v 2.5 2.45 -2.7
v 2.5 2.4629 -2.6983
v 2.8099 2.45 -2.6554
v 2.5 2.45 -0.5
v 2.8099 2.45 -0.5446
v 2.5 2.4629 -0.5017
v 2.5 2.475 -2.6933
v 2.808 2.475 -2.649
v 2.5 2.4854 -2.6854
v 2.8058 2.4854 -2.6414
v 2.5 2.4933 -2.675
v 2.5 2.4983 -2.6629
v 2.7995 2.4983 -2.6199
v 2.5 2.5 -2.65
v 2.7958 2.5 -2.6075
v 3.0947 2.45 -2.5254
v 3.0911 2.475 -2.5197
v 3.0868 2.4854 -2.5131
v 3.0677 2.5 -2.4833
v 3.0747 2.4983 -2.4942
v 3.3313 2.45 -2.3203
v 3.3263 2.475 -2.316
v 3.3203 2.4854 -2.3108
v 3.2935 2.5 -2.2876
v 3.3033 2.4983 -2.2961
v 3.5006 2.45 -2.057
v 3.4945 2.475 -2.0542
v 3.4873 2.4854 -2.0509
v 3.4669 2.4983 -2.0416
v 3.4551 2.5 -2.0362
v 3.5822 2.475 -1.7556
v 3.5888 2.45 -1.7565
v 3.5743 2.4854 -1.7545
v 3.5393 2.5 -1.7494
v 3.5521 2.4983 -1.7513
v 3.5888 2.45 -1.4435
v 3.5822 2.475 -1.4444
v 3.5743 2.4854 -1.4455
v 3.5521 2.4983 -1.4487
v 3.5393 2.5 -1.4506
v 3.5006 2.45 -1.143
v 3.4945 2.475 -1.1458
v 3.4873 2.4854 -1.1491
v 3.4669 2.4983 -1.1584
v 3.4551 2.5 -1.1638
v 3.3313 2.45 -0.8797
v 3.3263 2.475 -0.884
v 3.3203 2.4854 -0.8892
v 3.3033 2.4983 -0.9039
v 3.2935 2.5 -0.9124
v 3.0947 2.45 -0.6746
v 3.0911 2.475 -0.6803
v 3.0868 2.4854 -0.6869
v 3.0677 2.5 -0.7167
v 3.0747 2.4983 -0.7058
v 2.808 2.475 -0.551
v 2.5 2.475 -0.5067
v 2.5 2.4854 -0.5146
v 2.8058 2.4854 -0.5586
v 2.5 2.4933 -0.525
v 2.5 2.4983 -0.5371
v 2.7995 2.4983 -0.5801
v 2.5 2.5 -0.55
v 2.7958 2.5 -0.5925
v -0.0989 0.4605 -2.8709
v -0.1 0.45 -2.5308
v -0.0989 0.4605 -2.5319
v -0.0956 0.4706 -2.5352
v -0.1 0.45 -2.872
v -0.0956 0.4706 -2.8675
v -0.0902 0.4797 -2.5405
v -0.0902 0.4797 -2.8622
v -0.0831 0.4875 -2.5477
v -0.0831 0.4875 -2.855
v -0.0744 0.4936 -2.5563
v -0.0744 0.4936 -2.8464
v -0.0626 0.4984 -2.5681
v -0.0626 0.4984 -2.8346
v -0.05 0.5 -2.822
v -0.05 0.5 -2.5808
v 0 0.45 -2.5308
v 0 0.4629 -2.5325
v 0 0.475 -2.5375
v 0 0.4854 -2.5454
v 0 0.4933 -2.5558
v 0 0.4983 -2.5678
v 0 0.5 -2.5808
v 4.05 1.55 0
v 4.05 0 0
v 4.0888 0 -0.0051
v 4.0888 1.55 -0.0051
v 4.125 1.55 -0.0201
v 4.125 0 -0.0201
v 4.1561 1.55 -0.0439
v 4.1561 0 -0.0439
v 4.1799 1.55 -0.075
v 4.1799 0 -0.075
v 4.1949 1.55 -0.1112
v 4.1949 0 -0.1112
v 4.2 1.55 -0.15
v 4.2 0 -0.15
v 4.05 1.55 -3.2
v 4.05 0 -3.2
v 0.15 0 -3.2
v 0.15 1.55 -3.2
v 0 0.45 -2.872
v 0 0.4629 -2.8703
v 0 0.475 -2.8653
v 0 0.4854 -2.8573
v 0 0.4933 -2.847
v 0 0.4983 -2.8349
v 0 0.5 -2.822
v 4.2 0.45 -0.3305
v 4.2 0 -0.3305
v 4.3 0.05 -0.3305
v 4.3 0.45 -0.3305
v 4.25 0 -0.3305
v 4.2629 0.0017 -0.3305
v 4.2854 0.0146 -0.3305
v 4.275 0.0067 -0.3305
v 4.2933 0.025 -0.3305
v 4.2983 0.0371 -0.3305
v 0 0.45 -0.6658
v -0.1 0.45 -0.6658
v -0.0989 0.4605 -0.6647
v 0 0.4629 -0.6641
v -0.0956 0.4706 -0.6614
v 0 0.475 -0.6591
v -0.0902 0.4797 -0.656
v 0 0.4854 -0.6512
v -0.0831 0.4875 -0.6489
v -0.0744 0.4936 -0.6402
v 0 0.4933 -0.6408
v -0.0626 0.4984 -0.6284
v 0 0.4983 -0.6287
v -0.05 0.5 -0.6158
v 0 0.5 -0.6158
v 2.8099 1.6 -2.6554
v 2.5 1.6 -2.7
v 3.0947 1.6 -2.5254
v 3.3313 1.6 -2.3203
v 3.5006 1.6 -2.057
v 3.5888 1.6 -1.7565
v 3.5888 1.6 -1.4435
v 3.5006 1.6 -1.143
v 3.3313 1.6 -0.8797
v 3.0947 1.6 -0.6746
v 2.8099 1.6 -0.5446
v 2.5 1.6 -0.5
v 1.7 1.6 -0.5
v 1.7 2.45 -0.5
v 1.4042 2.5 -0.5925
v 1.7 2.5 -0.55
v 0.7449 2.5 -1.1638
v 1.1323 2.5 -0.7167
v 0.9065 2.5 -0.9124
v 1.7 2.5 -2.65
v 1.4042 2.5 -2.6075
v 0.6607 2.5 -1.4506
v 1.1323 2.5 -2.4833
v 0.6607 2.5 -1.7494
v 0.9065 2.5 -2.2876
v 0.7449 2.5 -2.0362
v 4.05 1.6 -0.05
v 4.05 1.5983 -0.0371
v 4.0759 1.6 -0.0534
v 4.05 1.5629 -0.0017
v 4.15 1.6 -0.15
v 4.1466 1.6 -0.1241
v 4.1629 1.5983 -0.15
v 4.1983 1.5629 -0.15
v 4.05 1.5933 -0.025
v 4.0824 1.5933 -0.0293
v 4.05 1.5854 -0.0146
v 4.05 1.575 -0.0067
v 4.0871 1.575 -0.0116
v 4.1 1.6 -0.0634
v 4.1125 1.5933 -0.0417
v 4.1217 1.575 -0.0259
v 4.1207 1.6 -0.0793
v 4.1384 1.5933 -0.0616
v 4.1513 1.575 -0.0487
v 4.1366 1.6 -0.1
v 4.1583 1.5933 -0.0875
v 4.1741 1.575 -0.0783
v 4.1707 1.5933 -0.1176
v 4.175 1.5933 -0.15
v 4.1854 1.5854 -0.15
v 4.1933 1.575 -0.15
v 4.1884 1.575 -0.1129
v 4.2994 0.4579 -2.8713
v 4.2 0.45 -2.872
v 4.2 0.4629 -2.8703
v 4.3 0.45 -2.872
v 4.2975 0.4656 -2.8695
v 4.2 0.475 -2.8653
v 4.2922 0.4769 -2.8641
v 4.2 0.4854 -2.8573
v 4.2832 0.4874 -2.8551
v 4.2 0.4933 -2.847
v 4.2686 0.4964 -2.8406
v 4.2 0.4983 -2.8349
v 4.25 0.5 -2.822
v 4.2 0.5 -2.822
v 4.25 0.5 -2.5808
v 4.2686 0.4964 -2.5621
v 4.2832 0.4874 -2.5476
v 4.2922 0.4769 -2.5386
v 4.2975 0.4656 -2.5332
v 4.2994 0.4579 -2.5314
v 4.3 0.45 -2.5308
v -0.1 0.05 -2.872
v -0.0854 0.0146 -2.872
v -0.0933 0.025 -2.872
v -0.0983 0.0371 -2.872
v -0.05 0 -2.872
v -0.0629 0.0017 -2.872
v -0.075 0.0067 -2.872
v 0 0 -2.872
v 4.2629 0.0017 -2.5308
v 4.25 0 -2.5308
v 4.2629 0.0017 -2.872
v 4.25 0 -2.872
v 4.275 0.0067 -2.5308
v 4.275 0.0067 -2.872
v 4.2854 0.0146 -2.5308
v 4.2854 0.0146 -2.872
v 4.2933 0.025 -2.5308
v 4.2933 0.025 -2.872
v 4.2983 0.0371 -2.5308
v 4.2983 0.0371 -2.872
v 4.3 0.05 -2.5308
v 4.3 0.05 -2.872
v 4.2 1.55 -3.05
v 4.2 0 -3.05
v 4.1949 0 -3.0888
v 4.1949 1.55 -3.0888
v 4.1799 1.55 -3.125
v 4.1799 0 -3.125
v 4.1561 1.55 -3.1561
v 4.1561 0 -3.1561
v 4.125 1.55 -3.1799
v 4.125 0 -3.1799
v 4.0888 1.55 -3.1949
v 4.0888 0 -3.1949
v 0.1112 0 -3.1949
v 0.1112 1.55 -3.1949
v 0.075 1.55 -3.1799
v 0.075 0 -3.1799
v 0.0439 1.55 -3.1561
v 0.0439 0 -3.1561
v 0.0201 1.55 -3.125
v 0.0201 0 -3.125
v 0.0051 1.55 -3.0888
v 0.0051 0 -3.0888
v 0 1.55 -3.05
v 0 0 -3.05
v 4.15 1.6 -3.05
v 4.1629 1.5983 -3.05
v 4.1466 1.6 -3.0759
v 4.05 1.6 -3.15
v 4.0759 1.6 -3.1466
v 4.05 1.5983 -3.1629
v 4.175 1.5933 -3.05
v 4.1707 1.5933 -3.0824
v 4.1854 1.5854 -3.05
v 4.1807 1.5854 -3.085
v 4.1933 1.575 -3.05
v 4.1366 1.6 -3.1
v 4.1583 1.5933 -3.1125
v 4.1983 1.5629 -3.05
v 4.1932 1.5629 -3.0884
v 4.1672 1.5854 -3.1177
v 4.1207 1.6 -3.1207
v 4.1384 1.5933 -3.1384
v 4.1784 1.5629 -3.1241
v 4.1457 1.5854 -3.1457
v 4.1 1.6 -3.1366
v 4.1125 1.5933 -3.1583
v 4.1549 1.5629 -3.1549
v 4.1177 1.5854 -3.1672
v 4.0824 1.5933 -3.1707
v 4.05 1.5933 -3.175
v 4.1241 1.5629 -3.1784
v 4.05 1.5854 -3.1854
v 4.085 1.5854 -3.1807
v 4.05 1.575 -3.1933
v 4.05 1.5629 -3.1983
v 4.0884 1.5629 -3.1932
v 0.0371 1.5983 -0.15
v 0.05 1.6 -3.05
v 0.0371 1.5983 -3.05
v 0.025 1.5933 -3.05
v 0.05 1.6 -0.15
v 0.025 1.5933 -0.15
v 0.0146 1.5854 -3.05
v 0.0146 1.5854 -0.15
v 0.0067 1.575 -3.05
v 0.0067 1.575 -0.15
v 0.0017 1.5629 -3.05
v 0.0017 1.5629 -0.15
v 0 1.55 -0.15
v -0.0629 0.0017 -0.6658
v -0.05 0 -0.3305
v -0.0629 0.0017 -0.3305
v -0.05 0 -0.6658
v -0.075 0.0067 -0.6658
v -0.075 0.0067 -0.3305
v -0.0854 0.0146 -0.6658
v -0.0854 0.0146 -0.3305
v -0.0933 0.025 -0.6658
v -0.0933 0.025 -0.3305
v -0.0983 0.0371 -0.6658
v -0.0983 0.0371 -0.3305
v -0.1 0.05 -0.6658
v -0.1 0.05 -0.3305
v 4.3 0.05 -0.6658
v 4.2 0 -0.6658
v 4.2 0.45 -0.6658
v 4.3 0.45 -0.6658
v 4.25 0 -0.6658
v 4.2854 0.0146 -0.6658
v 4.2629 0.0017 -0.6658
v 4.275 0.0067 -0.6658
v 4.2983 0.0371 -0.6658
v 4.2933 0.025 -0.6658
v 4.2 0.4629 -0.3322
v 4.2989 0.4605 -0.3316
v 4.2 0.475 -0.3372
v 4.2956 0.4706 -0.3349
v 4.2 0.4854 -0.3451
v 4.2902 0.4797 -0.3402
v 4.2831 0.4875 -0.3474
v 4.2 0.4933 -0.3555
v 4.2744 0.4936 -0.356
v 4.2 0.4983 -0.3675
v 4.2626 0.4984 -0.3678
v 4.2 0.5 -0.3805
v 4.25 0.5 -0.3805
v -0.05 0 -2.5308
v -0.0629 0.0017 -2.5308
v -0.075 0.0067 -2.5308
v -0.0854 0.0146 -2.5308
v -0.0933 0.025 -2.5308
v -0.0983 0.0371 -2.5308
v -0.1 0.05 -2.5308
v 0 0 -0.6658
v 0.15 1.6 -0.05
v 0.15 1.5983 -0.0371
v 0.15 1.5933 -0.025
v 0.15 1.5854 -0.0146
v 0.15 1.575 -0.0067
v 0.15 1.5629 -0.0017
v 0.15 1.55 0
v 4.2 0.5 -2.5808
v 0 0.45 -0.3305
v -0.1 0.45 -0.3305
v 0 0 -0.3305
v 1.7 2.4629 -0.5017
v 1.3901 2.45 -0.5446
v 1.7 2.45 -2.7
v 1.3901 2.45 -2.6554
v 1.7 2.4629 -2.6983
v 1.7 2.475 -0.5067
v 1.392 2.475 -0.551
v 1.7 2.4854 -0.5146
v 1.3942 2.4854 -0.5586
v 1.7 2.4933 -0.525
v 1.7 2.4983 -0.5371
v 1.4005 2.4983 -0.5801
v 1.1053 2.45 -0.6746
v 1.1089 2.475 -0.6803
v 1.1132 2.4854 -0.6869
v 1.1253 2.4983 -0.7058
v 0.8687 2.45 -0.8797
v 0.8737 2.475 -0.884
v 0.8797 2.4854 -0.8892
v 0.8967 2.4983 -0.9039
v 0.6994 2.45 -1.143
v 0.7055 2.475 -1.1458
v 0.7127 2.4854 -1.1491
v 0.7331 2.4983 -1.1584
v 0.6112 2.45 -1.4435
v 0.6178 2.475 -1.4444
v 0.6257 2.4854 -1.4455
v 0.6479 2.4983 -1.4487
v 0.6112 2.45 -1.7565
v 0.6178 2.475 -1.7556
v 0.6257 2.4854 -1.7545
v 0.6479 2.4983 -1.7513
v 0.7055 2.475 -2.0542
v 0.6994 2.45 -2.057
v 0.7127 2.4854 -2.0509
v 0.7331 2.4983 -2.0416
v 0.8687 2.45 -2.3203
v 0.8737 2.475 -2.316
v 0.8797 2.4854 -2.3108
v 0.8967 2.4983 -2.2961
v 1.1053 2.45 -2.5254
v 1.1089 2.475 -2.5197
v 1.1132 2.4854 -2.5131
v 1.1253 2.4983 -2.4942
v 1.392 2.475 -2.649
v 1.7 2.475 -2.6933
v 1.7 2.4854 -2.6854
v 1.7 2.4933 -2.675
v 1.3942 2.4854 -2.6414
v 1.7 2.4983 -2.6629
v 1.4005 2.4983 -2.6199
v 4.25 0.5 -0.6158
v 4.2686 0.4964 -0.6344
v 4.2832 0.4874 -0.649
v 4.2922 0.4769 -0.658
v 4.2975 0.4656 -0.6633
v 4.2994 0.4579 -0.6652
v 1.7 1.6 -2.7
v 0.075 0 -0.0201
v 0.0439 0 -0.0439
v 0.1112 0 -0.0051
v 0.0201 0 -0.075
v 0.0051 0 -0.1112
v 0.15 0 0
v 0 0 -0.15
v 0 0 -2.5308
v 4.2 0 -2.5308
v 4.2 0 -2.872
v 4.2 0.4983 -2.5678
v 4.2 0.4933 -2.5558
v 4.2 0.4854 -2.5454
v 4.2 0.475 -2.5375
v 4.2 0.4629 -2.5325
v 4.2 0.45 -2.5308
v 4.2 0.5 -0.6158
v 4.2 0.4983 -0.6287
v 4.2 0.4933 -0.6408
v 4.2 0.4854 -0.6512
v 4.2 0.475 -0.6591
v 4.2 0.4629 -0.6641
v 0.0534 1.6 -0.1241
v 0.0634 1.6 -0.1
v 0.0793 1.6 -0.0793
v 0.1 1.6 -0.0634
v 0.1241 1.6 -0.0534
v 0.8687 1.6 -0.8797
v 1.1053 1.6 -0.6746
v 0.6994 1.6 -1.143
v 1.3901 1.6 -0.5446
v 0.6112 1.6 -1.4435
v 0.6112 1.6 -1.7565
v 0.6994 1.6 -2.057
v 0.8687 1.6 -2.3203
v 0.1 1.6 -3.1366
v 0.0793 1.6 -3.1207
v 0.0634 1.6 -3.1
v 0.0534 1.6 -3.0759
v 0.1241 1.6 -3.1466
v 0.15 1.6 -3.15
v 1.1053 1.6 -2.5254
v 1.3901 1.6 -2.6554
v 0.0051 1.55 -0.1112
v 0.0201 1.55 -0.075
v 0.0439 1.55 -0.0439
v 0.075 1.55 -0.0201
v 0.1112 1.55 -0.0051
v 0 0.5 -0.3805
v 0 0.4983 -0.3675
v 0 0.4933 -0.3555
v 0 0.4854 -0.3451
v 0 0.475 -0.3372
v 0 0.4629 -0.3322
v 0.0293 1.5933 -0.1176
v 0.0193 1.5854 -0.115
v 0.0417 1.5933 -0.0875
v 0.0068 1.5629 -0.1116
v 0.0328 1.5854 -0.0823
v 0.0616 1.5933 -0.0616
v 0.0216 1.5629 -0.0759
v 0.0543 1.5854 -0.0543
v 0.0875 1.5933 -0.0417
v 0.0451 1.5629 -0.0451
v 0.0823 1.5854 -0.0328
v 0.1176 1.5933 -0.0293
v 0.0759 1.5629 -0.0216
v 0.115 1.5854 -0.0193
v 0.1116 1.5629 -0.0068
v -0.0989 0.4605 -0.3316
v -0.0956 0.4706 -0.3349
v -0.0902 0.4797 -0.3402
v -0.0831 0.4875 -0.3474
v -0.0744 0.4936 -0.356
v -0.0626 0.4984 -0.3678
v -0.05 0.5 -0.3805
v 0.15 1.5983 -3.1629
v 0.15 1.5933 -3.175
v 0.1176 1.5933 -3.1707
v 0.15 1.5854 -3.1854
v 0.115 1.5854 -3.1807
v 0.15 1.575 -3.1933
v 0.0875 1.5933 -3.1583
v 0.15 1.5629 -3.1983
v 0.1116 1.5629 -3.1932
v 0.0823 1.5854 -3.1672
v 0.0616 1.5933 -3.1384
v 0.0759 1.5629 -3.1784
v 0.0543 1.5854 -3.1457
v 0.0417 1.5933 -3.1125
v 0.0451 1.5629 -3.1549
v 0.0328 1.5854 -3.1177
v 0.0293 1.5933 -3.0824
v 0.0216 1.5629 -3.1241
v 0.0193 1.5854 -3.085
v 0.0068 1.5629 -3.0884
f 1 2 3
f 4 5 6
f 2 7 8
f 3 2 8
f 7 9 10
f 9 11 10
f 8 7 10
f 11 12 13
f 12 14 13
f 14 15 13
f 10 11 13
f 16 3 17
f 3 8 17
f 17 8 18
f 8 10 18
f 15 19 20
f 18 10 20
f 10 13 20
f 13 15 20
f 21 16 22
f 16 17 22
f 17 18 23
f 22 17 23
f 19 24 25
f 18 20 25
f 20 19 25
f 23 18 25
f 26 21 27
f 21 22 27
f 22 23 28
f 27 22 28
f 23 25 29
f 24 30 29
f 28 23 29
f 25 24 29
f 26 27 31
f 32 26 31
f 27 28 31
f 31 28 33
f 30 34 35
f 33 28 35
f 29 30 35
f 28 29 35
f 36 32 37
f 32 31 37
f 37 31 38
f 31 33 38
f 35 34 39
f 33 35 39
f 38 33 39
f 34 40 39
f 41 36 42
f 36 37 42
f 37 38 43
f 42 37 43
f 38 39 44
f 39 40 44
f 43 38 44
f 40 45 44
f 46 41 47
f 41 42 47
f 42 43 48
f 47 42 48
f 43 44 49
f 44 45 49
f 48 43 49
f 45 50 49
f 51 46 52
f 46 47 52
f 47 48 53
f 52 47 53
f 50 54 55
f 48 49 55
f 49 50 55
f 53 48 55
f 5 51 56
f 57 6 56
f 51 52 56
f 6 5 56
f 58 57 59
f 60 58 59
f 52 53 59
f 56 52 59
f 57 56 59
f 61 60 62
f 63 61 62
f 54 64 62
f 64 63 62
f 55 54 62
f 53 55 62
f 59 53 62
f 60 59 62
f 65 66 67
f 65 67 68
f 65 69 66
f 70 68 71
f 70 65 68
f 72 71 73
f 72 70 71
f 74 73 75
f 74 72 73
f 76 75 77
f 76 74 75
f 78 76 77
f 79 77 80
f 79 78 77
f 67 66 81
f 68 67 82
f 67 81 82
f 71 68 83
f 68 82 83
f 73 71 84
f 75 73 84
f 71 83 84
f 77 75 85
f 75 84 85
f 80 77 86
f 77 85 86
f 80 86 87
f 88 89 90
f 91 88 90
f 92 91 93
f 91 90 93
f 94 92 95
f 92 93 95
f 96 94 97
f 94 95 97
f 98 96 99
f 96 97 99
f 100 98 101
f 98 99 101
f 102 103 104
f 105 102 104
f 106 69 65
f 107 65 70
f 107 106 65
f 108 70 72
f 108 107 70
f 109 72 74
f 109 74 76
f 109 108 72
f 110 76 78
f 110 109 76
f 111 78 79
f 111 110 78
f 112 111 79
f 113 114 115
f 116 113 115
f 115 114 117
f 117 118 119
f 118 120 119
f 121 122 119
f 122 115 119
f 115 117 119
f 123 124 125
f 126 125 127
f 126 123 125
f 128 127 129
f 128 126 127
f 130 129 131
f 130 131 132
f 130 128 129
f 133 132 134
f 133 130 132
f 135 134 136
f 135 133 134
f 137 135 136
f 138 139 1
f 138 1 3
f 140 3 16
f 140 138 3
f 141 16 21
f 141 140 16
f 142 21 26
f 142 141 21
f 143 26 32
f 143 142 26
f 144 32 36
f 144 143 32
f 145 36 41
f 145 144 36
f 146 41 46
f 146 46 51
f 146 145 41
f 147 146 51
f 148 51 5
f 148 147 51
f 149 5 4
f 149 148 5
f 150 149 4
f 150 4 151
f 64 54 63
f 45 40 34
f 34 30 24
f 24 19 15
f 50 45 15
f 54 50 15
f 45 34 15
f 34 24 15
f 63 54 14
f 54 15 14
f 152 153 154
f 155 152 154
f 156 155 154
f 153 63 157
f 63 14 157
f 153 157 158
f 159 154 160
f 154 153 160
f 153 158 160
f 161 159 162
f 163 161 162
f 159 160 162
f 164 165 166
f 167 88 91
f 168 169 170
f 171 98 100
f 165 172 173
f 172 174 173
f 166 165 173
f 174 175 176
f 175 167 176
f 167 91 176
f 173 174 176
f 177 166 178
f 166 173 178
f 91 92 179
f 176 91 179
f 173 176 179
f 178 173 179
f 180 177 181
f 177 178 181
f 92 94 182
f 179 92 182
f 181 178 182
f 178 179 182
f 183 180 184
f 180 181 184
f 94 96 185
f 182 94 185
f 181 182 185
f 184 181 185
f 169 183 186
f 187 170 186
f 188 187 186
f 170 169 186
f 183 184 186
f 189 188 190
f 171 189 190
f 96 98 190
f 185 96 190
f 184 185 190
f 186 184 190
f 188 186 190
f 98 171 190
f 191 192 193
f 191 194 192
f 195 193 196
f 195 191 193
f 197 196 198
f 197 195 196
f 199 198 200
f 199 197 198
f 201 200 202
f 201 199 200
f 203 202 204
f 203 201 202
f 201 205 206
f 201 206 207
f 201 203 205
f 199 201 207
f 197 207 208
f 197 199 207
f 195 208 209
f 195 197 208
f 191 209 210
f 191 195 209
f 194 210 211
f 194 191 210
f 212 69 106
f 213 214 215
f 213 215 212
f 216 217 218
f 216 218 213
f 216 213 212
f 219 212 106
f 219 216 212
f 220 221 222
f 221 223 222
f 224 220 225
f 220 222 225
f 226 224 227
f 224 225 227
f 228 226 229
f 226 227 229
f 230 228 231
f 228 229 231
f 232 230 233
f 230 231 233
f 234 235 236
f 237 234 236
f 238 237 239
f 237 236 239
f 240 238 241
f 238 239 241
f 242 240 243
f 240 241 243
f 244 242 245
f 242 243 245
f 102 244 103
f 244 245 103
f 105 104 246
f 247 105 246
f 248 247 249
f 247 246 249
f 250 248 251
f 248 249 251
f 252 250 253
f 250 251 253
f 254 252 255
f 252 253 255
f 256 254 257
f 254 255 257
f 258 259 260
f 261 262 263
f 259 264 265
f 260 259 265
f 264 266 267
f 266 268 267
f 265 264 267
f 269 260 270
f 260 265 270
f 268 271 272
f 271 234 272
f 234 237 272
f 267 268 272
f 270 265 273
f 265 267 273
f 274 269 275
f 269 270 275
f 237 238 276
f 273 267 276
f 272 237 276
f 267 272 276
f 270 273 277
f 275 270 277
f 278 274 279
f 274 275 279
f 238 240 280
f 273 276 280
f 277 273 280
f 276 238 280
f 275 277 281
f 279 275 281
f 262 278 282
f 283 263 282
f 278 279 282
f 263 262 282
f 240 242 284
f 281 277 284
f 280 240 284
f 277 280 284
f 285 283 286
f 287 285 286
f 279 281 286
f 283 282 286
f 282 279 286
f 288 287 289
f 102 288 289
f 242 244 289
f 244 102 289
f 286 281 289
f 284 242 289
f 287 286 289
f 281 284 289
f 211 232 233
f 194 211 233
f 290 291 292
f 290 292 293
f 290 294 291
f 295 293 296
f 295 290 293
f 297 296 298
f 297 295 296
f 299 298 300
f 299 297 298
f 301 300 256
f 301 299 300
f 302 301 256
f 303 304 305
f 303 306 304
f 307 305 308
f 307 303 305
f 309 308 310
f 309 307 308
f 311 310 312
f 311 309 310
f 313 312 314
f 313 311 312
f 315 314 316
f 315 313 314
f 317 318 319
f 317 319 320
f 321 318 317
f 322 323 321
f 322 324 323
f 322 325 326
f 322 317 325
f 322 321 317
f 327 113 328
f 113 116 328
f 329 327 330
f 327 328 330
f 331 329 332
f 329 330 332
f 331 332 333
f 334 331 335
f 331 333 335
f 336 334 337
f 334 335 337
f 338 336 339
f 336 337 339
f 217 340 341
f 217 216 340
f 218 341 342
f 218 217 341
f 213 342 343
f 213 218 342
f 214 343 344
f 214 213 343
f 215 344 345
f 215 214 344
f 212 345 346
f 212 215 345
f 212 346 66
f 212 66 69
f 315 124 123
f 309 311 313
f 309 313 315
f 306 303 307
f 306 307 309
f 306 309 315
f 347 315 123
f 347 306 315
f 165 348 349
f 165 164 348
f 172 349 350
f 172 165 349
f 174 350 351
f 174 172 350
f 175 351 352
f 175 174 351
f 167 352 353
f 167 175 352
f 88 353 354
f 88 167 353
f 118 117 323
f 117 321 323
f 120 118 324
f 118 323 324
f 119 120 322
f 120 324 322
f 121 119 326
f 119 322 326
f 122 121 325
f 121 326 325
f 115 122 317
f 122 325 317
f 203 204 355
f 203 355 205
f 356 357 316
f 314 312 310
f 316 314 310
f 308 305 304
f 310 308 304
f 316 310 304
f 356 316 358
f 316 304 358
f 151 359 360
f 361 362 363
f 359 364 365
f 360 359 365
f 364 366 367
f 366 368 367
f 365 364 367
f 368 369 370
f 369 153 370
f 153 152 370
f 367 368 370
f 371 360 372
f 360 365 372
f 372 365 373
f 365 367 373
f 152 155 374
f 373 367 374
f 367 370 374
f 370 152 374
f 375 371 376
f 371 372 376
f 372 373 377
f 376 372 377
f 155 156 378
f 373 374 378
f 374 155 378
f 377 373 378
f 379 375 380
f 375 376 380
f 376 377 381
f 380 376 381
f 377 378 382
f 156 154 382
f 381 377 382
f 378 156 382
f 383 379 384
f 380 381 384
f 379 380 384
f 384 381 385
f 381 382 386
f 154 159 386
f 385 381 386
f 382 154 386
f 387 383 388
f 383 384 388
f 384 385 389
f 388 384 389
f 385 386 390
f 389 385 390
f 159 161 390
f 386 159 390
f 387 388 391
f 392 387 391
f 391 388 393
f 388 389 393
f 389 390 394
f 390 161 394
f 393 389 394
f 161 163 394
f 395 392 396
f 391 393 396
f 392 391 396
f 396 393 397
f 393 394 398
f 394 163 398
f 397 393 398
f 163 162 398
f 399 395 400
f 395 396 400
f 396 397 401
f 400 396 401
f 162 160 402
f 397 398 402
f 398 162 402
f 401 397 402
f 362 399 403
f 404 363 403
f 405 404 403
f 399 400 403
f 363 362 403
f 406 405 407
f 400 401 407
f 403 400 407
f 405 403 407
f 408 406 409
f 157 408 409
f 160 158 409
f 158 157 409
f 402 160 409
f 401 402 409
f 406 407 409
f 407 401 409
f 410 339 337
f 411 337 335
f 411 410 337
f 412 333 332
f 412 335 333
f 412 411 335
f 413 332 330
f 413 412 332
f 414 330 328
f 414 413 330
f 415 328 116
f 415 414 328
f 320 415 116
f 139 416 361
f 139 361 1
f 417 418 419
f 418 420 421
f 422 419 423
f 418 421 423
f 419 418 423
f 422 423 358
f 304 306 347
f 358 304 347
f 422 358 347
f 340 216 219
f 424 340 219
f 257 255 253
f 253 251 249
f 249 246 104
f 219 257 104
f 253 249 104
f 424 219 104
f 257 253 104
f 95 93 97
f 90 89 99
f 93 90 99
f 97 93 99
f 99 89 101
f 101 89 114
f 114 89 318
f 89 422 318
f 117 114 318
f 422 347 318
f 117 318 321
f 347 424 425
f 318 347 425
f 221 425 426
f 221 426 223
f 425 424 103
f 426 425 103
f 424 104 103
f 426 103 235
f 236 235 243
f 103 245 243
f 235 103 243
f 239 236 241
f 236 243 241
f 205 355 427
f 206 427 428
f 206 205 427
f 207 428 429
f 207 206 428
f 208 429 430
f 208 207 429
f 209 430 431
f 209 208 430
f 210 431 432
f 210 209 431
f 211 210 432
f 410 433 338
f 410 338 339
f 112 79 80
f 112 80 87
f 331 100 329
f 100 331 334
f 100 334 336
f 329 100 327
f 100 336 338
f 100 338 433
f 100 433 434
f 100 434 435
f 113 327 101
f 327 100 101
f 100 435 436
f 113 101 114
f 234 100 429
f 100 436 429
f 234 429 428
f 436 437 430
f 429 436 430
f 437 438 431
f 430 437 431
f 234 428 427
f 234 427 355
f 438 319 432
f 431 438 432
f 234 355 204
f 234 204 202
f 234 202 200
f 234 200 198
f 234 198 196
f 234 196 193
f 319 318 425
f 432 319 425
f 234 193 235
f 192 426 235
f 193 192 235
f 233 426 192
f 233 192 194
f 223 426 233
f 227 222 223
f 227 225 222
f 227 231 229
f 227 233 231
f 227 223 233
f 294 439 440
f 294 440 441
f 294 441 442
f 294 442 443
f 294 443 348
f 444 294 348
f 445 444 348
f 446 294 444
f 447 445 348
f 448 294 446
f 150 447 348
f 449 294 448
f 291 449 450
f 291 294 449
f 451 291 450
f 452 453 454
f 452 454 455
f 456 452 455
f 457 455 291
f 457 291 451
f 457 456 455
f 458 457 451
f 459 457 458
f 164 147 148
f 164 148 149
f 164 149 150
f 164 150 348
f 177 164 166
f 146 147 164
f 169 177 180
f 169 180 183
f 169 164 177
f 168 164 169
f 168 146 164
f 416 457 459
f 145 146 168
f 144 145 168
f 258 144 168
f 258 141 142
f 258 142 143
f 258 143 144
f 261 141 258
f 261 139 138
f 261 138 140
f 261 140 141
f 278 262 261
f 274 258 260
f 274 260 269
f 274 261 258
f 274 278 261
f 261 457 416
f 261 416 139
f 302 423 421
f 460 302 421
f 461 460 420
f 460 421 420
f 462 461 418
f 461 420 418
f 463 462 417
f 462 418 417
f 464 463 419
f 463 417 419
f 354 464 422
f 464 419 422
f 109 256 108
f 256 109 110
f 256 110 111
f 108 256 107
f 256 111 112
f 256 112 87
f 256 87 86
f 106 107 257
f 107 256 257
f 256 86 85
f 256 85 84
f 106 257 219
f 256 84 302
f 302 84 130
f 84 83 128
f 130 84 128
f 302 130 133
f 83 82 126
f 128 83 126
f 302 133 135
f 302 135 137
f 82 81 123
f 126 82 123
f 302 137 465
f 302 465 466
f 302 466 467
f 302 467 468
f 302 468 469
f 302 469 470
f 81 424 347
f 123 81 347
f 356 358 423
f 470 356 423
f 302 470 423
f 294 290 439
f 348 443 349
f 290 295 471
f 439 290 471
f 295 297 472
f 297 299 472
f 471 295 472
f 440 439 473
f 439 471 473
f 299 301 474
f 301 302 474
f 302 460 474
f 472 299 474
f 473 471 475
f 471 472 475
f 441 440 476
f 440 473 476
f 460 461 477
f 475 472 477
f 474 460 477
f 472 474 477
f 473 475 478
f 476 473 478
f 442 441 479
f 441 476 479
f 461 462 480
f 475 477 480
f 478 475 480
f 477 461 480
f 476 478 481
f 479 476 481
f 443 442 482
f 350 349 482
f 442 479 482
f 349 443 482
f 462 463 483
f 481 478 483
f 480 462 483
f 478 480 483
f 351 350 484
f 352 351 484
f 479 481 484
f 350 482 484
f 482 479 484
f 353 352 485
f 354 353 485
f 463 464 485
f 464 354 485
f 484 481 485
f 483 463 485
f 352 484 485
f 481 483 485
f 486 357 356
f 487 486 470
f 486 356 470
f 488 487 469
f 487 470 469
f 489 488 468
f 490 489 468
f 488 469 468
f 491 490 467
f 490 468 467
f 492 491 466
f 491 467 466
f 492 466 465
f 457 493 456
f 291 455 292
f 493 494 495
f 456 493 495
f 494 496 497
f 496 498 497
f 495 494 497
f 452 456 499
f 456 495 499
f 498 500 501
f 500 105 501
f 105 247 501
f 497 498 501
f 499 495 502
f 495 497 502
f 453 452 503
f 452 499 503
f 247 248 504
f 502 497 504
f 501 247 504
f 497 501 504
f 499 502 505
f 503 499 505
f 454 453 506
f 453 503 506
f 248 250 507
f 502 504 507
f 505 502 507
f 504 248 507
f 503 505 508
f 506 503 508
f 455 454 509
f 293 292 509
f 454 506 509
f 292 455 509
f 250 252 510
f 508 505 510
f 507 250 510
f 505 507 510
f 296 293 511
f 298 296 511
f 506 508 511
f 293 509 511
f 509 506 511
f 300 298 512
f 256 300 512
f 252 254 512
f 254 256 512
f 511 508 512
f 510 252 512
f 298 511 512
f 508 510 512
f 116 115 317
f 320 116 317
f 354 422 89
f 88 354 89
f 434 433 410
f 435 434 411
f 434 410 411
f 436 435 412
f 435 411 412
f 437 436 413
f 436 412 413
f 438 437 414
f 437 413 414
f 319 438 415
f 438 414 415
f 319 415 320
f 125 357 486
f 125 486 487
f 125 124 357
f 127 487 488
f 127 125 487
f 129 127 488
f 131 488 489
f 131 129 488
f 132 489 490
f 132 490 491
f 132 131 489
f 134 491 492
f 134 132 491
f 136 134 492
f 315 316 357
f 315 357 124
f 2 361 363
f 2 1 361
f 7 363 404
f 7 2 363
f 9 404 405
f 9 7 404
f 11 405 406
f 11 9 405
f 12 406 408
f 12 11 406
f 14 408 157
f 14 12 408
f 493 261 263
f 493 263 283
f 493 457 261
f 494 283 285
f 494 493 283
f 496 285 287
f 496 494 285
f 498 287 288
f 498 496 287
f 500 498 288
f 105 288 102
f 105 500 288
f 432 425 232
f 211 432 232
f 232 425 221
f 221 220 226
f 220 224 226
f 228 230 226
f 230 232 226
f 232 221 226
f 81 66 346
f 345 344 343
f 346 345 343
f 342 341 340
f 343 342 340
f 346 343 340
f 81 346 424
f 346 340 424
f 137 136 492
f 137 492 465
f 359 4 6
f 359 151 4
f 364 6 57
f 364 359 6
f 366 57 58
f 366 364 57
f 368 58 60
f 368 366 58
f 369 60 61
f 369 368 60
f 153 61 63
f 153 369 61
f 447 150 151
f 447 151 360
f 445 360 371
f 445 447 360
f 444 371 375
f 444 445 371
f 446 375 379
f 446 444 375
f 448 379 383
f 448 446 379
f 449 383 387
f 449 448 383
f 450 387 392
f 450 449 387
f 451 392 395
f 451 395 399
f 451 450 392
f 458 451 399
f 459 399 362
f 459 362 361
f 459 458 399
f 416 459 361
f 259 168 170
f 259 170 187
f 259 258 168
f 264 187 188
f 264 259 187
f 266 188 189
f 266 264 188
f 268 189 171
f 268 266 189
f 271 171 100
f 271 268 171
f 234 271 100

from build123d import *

# Parameters (mm, degrees)
BOSS_EXTRU_1_DEPTH = 1.6
BOSS_EXTRU_2_DEPTH = 0.9
CONG_1_R           = 0.05
ESQUISSE4_W        = 0.1
ESQUISSE4_H        = 0.34122062
ESQUISSE4_H_2      = 0.335337507
BOSS_EXTRU_3_DEPTH = 0.5
CONG_2_R           = 0.05
CONG_3_R           = 0.05
CONG_4_R           = 0.05
CONG_5_R           = 0.05
CONG_6_R           = 0.05


with BuildPart() as part:
    # Esquisse1 → Boss.-Extru.1 (new body)
    with BuildSketch(Plane(origin=(0, 0, 0), x_dir=(1, 0, 0), z_dir=(0, 1, 0))):
        with BuildLine():
            Line((0.15, 0), (4.05, 0))
            ThreePointArc((4.05, 0), (4.156066017, 0.043933983), (4.2, 0.15))
            Line((4.2, 0.15), (4.2, 3.05))
            ThreePointArc((4.2, 3.05), (4.156066017, 3.156066017), (4.05, 3.2))
            Line((4.05, 3.2), (0.15, 3.2))
            ThreePointArc((0.15, 3.2), (0.043933983, 3.156066017), (0, 3.05))
            Line((0, 3.05), (0, 0.15))
            ThreePointArc((0, 0.15), (0.043933983, 0.043933983), (0.15, 0))
        make_face()
    extrude(amount=BOSS_EXTRU_1_DEPTH)

    # Esquisse3 → Boss.-Extru.2 (add)
    with BuildSketch(Plane(origin=(0, 1.6, 0), x_dir=(1, 0, 0), z_dir=(0, 1, 0))):
        with BuildLine():
            Line((1.7, 2.7), (2.5, 2.7))
            ThreePointArc((2.5, 2.7), (3.6, 1.6), (2.5, 0.5))
            Line((2.5, 0.5), (1.7, 0.5))
            ThreePointArc((1.7, 0.5), (0.6, 1.6), (1.7, 2.7))
        make_face()
    extrude(amount=BOSS_EXTRU_2_DEPTH)

    # Congé1
    cong_1_edges = [part.edges().sort_by_distance(p)[0] for p in [
        (0.6, 2.5, -1.6),
        (2.1, 2.5, -0.5),
        (3.6, 2.5, -1.6),
        (2.1, 2.5, -2.7),
    ]]
    fillet(cong_1_edges, radius=CONG_1_R)

    # Esquisse4 → Boss.-Extru.3 (add)
    with BuildSketch(Plane(origin=(0, 0, 0), x_dir=(1, 0, 0), z_dir=(0, 1, 0))):
        with Locations((-0.05, 2.701361962)):
            Rectangle(ESQUISSE4_W, ESQUISSE4_H)
        with Locations((4.25, 2.701361962)):
            Rectangle(ESQUISSE4_W, ESQUISSE4_H)
        with Locations((-0.05, 0.498135713)):
            Rectangle(ESQUISSE4_W, ESQUISSE4_H_2)
        with Locations((4.25, 0.498135713)):
            Rectangle(ESQUISSE4_W, ESQUISSE4_H_2)
    extrude(amount=BOSS_EXTRU_3_DEPTH)

    # Congé2
    cong_2_edges = [part.edges().sort_by_distance(p)[0] for p in [
        (4.156066017, 1.6, -0.043933983),
        (4.2, 1.6, -1.6),
        (4.156066017, 1.6, -3.156066017),
        (2.1, 1.6, -3.2),
        (0.043933983, 1.6, -3.156066017),
        (0, 1.6, -1.6),
        (0.043933983, 1.6, -0.043933983),
        (2.1, 1.6, 0),
    ]]
    fillet(cong_2_edges, radius=CONG_2_R)

    # Congé3
    cong_3_edges = [part.edges().sort_by_distance(p)[0] for p in [
        (4.25, 0.5, -2.530751652),
        (4.3, 0.5, -2.701361962),
        (4.25, 0.5, -2.871972272),
        (4.25, 0.5, -0.330466959),
        (4.3, 0.5, -0.498135713),
        (4.25, 0.5, -0.665804466),
    ]]
    fillet(cong_3_edges, radius=CONG_3_R)

    # Congé4
    cong_4_edges = [part.edges().sort_by_distance(p)[0] for p in [
        (-0.05, 0.5, -2.871972272),
        (-0.1, 0.5, -2.701361962),
        (-0.05, 0.5, -2.530751652),
        (-0.05, 0.5, -0.665804466),
        (-0.1, 0.5, -0.498135713),
        (-0.05, 0.5, -0.330466959),
    ]]
    fillet(cong_4_edges, radius=CONG_4_R)

    # Congé5
    cong_5_edges = [part.edges().sort_by_distance(p)[0] for p in [
        (-0.1, 0, -2.701361962),
        (-0.1, 0, -0.498135713),
    ]]
    fillet(cong_5_edges, radius=CONG_5_R)

    # Congé6
    cong_6_edges = [part.edges().sort_by_distance(p)[0] for p in [
        (4.3, 0, -2.701361962),
        (4.3, 0, -0.498135713),
    ]]
    fillet(cong_6_edges, radius=CONG_6_R)


solid = part.part
